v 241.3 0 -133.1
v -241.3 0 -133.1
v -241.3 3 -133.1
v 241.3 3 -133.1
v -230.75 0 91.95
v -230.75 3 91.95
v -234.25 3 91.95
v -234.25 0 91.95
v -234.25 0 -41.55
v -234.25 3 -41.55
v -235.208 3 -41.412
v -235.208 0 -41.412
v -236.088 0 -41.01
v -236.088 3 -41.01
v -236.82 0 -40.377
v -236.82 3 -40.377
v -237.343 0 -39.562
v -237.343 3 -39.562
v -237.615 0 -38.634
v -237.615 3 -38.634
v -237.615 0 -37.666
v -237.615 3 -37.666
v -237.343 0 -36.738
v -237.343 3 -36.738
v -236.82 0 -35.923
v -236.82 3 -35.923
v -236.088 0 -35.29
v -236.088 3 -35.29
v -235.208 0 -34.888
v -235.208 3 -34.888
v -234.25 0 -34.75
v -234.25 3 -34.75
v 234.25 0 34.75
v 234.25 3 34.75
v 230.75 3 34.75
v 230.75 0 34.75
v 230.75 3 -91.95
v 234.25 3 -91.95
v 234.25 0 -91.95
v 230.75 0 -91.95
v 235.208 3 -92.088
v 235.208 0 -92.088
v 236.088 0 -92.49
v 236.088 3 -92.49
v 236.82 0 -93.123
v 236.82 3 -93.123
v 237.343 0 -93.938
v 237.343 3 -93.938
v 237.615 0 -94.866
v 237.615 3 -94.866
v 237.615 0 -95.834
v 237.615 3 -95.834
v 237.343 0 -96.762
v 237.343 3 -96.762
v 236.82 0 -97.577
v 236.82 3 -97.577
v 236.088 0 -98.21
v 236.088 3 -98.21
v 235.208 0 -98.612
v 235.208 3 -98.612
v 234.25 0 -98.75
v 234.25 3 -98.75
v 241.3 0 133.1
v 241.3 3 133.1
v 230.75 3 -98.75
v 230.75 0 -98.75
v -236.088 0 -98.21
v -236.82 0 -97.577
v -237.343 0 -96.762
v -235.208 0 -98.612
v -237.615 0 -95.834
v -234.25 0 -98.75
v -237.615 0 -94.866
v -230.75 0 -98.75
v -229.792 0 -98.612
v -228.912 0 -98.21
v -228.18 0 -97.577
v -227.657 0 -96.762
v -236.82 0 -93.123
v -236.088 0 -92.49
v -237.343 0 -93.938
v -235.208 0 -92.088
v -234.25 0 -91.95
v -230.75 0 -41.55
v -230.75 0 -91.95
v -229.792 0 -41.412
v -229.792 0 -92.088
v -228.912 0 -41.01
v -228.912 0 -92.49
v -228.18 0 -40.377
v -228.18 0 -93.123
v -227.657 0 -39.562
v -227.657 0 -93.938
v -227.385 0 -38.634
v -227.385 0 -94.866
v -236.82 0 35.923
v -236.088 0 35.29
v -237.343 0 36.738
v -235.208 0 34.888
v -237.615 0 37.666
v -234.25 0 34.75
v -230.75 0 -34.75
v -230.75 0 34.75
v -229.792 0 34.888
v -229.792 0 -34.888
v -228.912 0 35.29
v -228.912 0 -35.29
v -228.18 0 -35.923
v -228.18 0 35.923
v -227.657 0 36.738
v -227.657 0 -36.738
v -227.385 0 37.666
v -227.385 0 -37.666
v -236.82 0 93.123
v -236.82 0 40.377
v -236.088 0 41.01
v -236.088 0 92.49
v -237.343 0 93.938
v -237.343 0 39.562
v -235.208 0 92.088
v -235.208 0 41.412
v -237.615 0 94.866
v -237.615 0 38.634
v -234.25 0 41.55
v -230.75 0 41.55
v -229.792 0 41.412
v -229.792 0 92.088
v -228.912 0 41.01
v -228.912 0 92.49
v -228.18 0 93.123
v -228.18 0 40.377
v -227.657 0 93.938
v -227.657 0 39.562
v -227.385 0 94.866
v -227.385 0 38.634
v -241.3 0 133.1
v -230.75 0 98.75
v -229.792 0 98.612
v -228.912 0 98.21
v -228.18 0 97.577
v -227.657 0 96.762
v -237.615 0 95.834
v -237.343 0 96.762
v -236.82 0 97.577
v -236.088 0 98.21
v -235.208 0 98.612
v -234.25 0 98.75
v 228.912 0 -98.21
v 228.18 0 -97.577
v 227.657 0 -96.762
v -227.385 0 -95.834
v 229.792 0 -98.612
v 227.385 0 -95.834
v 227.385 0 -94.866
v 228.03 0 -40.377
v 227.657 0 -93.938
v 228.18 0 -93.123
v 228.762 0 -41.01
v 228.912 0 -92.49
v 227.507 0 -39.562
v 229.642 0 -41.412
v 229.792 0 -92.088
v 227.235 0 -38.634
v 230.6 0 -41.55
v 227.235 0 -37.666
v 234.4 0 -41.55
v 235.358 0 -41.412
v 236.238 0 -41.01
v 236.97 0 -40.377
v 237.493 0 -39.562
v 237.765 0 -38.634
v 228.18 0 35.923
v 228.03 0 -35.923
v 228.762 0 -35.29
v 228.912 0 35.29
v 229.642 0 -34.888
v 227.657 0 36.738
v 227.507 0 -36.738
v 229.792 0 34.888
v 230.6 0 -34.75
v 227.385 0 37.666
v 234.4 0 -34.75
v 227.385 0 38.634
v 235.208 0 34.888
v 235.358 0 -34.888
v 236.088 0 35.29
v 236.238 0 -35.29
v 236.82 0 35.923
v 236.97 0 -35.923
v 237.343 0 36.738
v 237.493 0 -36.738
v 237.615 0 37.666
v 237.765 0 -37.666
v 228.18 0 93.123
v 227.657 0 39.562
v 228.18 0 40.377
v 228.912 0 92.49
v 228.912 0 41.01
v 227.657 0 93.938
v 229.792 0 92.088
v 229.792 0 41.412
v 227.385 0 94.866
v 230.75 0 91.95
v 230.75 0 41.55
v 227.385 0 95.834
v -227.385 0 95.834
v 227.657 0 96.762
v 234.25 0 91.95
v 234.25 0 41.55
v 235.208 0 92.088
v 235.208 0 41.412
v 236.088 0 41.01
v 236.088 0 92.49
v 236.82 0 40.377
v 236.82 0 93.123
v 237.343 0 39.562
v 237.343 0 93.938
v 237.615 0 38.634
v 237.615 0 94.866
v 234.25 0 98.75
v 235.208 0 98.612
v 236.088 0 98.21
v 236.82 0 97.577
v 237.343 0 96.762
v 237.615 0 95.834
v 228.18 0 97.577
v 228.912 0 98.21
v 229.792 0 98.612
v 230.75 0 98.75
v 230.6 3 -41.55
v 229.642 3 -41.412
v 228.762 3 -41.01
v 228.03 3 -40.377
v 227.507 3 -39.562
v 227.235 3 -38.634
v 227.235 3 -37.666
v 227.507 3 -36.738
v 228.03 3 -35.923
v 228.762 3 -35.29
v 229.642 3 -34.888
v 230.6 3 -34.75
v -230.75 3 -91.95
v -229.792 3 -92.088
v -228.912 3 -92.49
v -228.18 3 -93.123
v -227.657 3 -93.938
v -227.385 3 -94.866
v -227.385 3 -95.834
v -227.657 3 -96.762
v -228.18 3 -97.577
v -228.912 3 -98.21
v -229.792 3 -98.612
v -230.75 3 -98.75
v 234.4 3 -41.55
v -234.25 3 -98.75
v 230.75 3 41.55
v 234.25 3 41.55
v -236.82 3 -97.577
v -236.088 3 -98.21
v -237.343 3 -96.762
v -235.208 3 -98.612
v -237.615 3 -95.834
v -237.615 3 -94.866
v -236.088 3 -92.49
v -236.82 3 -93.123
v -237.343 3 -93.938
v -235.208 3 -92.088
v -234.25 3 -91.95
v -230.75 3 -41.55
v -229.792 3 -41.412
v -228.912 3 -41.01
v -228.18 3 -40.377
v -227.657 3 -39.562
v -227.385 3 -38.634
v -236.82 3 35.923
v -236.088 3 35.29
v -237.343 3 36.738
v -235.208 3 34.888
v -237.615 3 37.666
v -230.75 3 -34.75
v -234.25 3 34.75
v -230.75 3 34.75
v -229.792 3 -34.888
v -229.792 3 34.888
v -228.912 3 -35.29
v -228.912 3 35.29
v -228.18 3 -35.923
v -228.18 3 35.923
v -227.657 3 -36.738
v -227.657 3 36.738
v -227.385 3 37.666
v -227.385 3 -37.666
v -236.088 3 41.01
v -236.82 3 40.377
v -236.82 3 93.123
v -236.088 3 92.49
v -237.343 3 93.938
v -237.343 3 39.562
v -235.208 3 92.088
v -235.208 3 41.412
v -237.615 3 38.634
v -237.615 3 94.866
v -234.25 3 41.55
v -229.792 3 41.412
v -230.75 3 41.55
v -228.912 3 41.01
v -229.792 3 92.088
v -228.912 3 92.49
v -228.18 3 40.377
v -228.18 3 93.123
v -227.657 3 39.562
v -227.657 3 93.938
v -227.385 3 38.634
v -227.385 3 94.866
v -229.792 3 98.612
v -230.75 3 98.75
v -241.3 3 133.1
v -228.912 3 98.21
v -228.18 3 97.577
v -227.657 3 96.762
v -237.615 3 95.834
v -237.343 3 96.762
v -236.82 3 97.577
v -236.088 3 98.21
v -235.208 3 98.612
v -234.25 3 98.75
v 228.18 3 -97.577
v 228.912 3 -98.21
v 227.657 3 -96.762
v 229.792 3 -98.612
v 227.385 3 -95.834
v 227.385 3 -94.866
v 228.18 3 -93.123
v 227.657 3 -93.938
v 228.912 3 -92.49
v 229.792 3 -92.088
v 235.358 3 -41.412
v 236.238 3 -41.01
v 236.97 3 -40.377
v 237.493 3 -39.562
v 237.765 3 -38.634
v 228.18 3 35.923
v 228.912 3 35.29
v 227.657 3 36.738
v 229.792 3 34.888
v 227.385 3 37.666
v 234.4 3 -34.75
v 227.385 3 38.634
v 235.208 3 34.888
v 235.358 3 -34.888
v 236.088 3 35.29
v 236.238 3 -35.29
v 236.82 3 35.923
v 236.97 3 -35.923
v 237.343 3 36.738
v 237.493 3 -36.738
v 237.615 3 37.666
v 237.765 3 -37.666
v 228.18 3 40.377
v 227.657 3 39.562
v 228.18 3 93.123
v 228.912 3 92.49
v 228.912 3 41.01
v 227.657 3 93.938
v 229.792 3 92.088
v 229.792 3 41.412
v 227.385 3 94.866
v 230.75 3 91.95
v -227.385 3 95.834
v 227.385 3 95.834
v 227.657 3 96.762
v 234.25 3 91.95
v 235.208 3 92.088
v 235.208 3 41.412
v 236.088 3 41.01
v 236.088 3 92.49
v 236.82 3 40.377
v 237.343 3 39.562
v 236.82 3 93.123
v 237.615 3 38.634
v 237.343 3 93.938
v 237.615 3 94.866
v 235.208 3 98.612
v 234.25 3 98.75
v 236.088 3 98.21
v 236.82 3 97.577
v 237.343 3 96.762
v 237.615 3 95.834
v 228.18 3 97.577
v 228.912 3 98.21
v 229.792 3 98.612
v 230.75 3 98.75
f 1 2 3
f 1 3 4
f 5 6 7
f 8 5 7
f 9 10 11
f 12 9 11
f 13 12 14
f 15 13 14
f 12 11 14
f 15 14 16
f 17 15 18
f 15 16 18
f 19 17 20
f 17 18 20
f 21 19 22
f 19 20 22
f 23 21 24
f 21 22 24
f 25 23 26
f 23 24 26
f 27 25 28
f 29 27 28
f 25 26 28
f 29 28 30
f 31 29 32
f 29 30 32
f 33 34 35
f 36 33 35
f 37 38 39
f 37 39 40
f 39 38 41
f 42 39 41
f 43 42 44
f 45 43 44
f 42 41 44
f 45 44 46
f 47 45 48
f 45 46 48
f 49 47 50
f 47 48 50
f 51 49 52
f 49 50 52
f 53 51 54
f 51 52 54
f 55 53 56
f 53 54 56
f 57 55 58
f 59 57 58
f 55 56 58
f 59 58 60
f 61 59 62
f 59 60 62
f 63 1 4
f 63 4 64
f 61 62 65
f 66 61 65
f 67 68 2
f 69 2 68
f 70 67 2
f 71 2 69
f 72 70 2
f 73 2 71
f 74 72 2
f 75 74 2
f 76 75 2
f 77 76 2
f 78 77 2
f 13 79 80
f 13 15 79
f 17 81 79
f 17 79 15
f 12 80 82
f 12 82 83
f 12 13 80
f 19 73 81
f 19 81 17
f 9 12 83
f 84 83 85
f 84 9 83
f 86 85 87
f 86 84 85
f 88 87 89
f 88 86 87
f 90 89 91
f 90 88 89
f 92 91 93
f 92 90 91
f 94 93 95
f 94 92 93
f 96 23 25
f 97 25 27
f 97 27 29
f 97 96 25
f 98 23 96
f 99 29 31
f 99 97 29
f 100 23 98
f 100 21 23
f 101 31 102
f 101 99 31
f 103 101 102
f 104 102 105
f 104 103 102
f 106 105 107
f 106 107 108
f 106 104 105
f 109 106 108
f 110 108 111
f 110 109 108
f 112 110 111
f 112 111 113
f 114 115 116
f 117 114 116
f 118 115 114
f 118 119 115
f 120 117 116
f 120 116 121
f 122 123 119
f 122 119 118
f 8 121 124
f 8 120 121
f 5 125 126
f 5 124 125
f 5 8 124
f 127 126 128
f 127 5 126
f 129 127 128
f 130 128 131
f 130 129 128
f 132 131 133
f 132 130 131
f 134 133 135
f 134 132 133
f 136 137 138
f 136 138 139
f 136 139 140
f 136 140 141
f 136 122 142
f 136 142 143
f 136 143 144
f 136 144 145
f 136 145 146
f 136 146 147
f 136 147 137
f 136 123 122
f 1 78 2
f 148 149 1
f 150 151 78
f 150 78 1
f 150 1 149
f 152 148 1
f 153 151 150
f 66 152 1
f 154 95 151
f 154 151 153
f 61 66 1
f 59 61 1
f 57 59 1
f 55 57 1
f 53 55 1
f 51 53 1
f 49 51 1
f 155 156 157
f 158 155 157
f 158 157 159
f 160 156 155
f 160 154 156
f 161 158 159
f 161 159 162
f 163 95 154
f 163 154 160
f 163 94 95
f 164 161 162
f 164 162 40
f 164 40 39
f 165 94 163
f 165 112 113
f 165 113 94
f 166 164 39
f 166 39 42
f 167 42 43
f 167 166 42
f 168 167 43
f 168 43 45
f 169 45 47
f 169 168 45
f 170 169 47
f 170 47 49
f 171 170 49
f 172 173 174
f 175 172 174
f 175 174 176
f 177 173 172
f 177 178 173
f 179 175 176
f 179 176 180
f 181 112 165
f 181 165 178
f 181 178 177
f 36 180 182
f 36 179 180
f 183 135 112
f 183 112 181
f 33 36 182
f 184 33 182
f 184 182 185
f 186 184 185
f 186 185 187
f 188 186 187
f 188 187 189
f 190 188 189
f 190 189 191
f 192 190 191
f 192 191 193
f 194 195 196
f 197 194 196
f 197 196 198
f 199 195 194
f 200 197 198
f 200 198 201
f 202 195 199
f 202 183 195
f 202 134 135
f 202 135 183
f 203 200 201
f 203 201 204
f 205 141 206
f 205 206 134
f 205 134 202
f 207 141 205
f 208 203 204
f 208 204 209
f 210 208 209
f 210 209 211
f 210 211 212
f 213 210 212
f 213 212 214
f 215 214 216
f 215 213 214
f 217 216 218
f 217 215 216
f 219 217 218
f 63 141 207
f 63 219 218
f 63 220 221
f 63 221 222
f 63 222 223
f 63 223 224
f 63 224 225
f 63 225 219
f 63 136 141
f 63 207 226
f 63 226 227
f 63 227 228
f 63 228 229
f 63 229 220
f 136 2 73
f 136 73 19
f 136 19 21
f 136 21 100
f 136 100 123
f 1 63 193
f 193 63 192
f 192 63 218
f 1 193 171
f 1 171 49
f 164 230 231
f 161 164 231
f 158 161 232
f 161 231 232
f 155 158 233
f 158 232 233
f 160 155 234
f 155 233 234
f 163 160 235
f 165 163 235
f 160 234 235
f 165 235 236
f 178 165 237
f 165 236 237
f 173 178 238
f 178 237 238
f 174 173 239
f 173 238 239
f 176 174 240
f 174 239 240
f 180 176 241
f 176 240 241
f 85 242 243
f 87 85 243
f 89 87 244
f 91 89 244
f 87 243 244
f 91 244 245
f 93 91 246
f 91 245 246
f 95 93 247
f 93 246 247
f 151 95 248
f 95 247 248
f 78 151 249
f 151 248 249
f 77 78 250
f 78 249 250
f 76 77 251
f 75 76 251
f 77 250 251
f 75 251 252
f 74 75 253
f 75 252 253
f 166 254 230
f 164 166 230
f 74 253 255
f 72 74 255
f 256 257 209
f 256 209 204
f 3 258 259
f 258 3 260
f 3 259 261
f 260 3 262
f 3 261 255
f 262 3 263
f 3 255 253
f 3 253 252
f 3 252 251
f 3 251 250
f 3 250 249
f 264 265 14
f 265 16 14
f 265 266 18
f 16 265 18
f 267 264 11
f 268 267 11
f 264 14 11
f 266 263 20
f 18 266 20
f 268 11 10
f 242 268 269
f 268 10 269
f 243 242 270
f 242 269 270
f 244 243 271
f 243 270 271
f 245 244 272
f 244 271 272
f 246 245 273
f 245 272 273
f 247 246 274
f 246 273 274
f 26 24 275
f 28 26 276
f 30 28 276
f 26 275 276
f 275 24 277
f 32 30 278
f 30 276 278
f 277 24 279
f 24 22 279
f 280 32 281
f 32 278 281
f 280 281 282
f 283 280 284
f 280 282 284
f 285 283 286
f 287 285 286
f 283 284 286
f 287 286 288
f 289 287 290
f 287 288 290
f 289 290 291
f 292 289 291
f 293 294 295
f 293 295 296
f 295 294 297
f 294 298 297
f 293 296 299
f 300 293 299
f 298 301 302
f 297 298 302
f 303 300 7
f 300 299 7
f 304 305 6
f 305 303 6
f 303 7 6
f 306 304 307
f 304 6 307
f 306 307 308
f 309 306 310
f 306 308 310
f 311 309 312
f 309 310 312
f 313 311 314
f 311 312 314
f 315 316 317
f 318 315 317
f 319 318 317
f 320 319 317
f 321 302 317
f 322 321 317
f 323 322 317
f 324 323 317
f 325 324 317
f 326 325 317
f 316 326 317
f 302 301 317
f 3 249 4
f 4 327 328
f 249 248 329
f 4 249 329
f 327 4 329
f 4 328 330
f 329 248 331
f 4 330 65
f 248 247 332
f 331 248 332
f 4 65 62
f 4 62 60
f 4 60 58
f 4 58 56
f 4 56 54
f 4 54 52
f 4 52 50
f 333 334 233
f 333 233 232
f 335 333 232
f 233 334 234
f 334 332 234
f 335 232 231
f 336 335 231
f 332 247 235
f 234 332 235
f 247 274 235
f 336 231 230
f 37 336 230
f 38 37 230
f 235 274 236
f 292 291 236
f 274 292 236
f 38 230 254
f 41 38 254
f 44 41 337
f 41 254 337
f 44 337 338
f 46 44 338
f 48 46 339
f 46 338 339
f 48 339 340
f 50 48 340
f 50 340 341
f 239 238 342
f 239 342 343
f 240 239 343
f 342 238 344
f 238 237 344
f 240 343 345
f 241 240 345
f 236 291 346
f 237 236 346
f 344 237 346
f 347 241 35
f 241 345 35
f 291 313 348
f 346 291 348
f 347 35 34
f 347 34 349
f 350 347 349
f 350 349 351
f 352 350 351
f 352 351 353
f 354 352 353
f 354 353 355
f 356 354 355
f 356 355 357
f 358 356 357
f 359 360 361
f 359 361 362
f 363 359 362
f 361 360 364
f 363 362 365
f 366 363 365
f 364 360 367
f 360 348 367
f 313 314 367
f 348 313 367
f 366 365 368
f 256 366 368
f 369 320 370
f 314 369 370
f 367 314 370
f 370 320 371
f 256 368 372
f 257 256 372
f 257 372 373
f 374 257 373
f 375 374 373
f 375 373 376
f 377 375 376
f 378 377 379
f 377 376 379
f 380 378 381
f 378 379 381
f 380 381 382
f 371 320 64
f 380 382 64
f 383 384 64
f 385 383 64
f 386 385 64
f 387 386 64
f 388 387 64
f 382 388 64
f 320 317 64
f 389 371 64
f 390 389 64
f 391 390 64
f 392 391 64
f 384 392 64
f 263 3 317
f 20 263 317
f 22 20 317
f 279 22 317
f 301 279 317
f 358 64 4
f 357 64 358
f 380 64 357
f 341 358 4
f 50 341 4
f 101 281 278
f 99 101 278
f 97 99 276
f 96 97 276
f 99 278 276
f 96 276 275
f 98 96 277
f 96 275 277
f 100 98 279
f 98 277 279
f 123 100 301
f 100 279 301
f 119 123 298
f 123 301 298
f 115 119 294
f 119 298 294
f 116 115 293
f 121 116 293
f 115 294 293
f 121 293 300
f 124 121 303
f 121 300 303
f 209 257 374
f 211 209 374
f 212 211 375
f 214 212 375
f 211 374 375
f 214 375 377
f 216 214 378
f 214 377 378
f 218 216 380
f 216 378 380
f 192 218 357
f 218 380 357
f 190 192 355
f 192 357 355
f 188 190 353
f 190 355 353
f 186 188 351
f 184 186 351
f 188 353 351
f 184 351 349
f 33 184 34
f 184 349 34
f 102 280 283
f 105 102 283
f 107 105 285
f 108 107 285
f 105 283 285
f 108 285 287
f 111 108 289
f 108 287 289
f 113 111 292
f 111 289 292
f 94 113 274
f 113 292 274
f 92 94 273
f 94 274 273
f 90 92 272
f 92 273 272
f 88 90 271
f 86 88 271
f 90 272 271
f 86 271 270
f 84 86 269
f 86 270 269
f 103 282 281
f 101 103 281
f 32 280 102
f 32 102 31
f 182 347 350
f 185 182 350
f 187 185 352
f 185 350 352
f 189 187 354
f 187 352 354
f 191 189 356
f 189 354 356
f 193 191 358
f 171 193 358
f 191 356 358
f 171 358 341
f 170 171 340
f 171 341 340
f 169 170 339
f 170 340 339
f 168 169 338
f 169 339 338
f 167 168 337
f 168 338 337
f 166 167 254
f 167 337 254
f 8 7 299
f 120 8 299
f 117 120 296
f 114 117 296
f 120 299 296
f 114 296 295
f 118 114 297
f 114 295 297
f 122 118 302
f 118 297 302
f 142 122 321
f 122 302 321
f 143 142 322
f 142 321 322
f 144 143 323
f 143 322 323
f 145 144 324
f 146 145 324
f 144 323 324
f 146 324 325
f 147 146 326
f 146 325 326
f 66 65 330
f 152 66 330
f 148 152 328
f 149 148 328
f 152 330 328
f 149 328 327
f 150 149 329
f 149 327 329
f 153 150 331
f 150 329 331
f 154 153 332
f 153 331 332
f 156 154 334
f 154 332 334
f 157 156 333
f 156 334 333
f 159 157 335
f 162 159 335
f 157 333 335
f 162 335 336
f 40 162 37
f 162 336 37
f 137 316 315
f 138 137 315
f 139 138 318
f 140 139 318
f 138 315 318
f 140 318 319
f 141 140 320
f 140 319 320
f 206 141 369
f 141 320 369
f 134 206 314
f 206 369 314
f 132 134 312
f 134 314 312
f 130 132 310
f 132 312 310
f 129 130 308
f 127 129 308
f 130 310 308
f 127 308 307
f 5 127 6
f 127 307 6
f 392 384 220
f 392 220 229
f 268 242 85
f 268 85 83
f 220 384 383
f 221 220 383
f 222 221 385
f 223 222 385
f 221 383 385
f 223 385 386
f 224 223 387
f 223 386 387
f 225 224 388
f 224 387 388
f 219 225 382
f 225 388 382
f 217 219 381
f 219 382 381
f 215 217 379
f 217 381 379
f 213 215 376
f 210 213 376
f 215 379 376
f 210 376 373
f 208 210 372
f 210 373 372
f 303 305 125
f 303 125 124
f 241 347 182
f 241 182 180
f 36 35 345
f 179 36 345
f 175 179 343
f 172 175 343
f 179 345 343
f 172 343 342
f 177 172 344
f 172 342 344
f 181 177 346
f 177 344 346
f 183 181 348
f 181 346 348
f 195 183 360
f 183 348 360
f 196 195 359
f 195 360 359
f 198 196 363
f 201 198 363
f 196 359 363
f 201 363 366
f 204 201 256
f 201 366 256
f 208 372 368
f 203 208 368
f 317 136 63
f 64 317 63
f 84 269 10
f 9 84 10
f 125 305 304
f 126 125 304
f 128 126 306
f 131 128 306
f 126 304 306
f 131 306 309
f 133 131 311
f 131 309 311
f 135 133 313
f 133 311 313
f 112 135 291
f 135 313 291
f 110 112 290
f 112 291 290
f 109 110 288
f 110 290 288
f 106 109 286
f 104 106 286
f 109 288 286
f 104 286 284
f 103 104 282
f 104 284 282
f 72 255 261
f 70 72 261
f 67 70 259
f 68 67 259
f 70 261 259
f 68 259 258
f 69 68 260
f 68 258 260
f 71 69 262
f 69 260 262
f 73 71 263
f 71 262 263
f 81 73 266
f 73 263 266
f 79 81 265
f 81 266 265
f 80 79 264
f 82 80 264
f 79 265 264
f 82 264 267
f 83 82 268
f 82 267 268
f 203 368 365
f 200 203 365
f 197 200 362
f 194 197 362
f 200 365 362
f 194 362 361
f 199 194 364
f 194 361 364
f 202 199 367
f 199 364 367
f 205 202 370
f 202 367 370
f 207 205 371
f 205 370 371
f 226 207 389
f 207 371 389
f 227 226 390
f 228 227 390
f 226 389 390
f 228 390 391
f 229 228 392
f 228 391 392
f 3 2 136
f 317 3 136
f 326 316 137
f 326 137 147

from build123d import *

# Parameters (mm, degrees)
F0_W      = 482.6
F0_H      = 266.2
F1_DEPTH  = 3
F2_W      = 3.5
F2_H      = 6.8
F3_DEPTH  = 3
F4_W      = 3.5
F4_H      = 6.8
F5_DEPTH  = 3
F6_W      = 3.5
F6_H      = 6.8
F7_DEPTH  = 3
F8_W      = 3.5
F8_H      = 6.8
F9_DEPTH  = 3
F12_W     = 3.8
F12_H     = 6.8
F12_W_2   = 3.5
F10_W     = 3.5
F10_H     = 6.8
F11_W     = 3.5
F11_H     = 6.8
F13_DEPTH = 3


with BuildPart() as f1:
    # F0 (on Front) → F1 (new body)
    with BuildSketch(Plane.XZ):
        Rectangle(F0_W, F0_H)
    extrude(amount=-F1_DEPTH)

    # F2 (on face) → F3 (cut)
    with BuildSketch(Plane(origin=(0, 3, 0), x_dir=(-1, 0, 0), z_dir=(0, 1, 0))):
        with Locations((232.5, 95.35)):
            Rectangle(F2_W, F2_H)
        with BuildLine():
            Line((234.25, 98.75), (234.25, 91.95))
            ThreePointArc((234.25, 91.95), (237.65, 95.35), (234.25, 98.75))
        make_face()
        with BuildLine():
            ThreePointArc((230.75, 98.75), (227.35, 95.35), (230.75, 91.95))
            Line((230.75, 91.95), (230.75, 98.75))
        make_face()
    extrude(amount=-F3_DEPTH, mode=Mode.SUBTRACT)

    # F4 (on face) → F5 (cut)
    with BuildSketch(Plane(origin=(0, 3, 0), x_dir=(-1, 0, 0), z_dir=(0, 1, 0))):
        with Locations((232.5, 38.15)):
            Rectangle(F4_W, F4_H)
        with BuildLine():
            Line((234.25, 41.55), (234.25, 34.75))
            ThreePointArc((234.25, 34.75), (237.65, 38.15), (234.25, 41.55))
        make_face()
        with BuildLine():
            ThreePointArc((230.75, 41.55), (227.35, 38.15), (230.75, 34.75))
            Line((230.75, 34.75), (230.75, 41.55))
        make_face()
    extrude(amount=-F5_DEPTH, mode=Mode.SUBTRACT)

    # F6 (on face) → F7 (cut)
    with BuildSketch(Plane(origin=(0, 3, 0), x_dir=(-1, 0, 0), z_dir=(0, 1, 0))):
        with Locations((232.5, -38.15)):
            Rectangle(F6_W, F6_H)
        with BuildLine():
            Line((234.25, -34.75), (234.25, -41.55))
            ThreePointArc((234.25, -41.55), (237.65, -38.15), (234.25, -34.75))
        make_face()
        with BuildLine():
            ThreePointArc((230.75, -34.75), (227.35, -38.15), (230.75, -41.55))
            Line((230.75, -41.55), (230.75, -34.75))
        make_face()
    extrude(amount=-F7_DEPTH, mode=Mode.SUBTRACT)

    # F8 (on face) → F9 (cut)
    with BuildSketch(Plane(origin=(0, 3, 0), x_dir=(-1, 0, 0), z_dir=(0, 1, 0))):
        with Locations((232.5, -95.35)):
            Rectangle(F8_W, F8_H)
        with BuildLine():
            ThreePointArc((234.25, -98.75), (237.65, -95.35), (234.25, -91.95))
            Line((234.25, -91.95), (234.25, -98.75))
        make_face()
        with BuildLine():
            Line((230.75, -98.75), (230.75, -91.95))
            ThreePointArc((230.75, -91.95), (227.35, -95.35), (230.75, -98.75))
        make_face()
    extrude(amount=-F9_DEPTH, mode=Mode.SUBTRACT)

    # F12 (on face) + F10 (on face) + F11 (on face) → F13 (cut)
    with BuildSketch(Plane(origin=(0, 3, 0), x_dir=(-1, 0, 0), z_dir=(0, 1, 0))):
        with Locations((-232.5, -38.15)):
            Rectangle(F12_W, F12_H)
        with BuildLine():
            Line((-230.6, -34.75), (-230.6, -41.55))
            ThreePointArc((-230.6, -41.55), (-227.2, -38.15), (-230.6, -34.75))
        make_face()
        with BuildLine():
            ThreePointArc((-234.4, -34.75), (-237.8, -38.15), (-234.4, -41.55))
            Line((-234.4, -41.55), (-234.4, -34.75))
        make_face()
        with Locations((-232.5, -95.35)):
            Rectangle(F12_W_2, F12_H)
        with BuildLine():
            Line((-230.75, -91.95), (-230.75, -98.75))
            ThreePointArc((-230.75, -98.75), (-227.35, -95.35), (-230.75, -91.95))
        make_face()
        with BuildLine():
            ThreePointArc((-234.25, -91.95), (-237.65, -95.35), (-234.25, -98.75))
            Line((-234.25, -98.75), (-234.25, -91.95))
        make_face()
    with BuildSketch(Plane(origin=(0, 3, 0), x_dir=(-1, 0, 0), z_dir=(0, 1, 0))):
        with Locations((-232.5, 95.35)):
            Rectangle(F10_W, F10_H)
        with BuildLine():
            Line((-230.75, 98.75), (-230.75, 91.95))
            ThreePointArc((-230.75, 91.95), (-227.35, 95.35), (-230.75, 98.75))
        make_face()
        with BuildLine():
            ThreePointArc((-234.25, 98.75), (-237.65, 95.35), (-234.25, 91.95))
            Line((-234.25, 91.95), (-234.25, 98.75))
        make_face()
    with BuildSketch(Plane(origin=(0, 3, 0), x_dir=(-1, 0, 0), z_dir=(0, 1, 0))):
        with Locations((-232.5, 38.15)):
            Rectangle(F11_W, F11_H)
        with BuildLine():
            Line((-234.25, 34.75), (-234.25, 41.55))
            ThreePointArc((-234.25, 41.55), (-237.65, 38.15), (-234.25, 34.75))
        make_face()
        with BuildLine():
            ThreePointArc((-230.75, 34.75), (-227.35, 38.15), (-230.75, 41.55))
            Line((-230.75, 41.55), (-230.75, 34.75))
        make_face()
    extrude(amount=-F13_DEPTH, mode=Mode.SUBTRACT)


solid = f1.part
